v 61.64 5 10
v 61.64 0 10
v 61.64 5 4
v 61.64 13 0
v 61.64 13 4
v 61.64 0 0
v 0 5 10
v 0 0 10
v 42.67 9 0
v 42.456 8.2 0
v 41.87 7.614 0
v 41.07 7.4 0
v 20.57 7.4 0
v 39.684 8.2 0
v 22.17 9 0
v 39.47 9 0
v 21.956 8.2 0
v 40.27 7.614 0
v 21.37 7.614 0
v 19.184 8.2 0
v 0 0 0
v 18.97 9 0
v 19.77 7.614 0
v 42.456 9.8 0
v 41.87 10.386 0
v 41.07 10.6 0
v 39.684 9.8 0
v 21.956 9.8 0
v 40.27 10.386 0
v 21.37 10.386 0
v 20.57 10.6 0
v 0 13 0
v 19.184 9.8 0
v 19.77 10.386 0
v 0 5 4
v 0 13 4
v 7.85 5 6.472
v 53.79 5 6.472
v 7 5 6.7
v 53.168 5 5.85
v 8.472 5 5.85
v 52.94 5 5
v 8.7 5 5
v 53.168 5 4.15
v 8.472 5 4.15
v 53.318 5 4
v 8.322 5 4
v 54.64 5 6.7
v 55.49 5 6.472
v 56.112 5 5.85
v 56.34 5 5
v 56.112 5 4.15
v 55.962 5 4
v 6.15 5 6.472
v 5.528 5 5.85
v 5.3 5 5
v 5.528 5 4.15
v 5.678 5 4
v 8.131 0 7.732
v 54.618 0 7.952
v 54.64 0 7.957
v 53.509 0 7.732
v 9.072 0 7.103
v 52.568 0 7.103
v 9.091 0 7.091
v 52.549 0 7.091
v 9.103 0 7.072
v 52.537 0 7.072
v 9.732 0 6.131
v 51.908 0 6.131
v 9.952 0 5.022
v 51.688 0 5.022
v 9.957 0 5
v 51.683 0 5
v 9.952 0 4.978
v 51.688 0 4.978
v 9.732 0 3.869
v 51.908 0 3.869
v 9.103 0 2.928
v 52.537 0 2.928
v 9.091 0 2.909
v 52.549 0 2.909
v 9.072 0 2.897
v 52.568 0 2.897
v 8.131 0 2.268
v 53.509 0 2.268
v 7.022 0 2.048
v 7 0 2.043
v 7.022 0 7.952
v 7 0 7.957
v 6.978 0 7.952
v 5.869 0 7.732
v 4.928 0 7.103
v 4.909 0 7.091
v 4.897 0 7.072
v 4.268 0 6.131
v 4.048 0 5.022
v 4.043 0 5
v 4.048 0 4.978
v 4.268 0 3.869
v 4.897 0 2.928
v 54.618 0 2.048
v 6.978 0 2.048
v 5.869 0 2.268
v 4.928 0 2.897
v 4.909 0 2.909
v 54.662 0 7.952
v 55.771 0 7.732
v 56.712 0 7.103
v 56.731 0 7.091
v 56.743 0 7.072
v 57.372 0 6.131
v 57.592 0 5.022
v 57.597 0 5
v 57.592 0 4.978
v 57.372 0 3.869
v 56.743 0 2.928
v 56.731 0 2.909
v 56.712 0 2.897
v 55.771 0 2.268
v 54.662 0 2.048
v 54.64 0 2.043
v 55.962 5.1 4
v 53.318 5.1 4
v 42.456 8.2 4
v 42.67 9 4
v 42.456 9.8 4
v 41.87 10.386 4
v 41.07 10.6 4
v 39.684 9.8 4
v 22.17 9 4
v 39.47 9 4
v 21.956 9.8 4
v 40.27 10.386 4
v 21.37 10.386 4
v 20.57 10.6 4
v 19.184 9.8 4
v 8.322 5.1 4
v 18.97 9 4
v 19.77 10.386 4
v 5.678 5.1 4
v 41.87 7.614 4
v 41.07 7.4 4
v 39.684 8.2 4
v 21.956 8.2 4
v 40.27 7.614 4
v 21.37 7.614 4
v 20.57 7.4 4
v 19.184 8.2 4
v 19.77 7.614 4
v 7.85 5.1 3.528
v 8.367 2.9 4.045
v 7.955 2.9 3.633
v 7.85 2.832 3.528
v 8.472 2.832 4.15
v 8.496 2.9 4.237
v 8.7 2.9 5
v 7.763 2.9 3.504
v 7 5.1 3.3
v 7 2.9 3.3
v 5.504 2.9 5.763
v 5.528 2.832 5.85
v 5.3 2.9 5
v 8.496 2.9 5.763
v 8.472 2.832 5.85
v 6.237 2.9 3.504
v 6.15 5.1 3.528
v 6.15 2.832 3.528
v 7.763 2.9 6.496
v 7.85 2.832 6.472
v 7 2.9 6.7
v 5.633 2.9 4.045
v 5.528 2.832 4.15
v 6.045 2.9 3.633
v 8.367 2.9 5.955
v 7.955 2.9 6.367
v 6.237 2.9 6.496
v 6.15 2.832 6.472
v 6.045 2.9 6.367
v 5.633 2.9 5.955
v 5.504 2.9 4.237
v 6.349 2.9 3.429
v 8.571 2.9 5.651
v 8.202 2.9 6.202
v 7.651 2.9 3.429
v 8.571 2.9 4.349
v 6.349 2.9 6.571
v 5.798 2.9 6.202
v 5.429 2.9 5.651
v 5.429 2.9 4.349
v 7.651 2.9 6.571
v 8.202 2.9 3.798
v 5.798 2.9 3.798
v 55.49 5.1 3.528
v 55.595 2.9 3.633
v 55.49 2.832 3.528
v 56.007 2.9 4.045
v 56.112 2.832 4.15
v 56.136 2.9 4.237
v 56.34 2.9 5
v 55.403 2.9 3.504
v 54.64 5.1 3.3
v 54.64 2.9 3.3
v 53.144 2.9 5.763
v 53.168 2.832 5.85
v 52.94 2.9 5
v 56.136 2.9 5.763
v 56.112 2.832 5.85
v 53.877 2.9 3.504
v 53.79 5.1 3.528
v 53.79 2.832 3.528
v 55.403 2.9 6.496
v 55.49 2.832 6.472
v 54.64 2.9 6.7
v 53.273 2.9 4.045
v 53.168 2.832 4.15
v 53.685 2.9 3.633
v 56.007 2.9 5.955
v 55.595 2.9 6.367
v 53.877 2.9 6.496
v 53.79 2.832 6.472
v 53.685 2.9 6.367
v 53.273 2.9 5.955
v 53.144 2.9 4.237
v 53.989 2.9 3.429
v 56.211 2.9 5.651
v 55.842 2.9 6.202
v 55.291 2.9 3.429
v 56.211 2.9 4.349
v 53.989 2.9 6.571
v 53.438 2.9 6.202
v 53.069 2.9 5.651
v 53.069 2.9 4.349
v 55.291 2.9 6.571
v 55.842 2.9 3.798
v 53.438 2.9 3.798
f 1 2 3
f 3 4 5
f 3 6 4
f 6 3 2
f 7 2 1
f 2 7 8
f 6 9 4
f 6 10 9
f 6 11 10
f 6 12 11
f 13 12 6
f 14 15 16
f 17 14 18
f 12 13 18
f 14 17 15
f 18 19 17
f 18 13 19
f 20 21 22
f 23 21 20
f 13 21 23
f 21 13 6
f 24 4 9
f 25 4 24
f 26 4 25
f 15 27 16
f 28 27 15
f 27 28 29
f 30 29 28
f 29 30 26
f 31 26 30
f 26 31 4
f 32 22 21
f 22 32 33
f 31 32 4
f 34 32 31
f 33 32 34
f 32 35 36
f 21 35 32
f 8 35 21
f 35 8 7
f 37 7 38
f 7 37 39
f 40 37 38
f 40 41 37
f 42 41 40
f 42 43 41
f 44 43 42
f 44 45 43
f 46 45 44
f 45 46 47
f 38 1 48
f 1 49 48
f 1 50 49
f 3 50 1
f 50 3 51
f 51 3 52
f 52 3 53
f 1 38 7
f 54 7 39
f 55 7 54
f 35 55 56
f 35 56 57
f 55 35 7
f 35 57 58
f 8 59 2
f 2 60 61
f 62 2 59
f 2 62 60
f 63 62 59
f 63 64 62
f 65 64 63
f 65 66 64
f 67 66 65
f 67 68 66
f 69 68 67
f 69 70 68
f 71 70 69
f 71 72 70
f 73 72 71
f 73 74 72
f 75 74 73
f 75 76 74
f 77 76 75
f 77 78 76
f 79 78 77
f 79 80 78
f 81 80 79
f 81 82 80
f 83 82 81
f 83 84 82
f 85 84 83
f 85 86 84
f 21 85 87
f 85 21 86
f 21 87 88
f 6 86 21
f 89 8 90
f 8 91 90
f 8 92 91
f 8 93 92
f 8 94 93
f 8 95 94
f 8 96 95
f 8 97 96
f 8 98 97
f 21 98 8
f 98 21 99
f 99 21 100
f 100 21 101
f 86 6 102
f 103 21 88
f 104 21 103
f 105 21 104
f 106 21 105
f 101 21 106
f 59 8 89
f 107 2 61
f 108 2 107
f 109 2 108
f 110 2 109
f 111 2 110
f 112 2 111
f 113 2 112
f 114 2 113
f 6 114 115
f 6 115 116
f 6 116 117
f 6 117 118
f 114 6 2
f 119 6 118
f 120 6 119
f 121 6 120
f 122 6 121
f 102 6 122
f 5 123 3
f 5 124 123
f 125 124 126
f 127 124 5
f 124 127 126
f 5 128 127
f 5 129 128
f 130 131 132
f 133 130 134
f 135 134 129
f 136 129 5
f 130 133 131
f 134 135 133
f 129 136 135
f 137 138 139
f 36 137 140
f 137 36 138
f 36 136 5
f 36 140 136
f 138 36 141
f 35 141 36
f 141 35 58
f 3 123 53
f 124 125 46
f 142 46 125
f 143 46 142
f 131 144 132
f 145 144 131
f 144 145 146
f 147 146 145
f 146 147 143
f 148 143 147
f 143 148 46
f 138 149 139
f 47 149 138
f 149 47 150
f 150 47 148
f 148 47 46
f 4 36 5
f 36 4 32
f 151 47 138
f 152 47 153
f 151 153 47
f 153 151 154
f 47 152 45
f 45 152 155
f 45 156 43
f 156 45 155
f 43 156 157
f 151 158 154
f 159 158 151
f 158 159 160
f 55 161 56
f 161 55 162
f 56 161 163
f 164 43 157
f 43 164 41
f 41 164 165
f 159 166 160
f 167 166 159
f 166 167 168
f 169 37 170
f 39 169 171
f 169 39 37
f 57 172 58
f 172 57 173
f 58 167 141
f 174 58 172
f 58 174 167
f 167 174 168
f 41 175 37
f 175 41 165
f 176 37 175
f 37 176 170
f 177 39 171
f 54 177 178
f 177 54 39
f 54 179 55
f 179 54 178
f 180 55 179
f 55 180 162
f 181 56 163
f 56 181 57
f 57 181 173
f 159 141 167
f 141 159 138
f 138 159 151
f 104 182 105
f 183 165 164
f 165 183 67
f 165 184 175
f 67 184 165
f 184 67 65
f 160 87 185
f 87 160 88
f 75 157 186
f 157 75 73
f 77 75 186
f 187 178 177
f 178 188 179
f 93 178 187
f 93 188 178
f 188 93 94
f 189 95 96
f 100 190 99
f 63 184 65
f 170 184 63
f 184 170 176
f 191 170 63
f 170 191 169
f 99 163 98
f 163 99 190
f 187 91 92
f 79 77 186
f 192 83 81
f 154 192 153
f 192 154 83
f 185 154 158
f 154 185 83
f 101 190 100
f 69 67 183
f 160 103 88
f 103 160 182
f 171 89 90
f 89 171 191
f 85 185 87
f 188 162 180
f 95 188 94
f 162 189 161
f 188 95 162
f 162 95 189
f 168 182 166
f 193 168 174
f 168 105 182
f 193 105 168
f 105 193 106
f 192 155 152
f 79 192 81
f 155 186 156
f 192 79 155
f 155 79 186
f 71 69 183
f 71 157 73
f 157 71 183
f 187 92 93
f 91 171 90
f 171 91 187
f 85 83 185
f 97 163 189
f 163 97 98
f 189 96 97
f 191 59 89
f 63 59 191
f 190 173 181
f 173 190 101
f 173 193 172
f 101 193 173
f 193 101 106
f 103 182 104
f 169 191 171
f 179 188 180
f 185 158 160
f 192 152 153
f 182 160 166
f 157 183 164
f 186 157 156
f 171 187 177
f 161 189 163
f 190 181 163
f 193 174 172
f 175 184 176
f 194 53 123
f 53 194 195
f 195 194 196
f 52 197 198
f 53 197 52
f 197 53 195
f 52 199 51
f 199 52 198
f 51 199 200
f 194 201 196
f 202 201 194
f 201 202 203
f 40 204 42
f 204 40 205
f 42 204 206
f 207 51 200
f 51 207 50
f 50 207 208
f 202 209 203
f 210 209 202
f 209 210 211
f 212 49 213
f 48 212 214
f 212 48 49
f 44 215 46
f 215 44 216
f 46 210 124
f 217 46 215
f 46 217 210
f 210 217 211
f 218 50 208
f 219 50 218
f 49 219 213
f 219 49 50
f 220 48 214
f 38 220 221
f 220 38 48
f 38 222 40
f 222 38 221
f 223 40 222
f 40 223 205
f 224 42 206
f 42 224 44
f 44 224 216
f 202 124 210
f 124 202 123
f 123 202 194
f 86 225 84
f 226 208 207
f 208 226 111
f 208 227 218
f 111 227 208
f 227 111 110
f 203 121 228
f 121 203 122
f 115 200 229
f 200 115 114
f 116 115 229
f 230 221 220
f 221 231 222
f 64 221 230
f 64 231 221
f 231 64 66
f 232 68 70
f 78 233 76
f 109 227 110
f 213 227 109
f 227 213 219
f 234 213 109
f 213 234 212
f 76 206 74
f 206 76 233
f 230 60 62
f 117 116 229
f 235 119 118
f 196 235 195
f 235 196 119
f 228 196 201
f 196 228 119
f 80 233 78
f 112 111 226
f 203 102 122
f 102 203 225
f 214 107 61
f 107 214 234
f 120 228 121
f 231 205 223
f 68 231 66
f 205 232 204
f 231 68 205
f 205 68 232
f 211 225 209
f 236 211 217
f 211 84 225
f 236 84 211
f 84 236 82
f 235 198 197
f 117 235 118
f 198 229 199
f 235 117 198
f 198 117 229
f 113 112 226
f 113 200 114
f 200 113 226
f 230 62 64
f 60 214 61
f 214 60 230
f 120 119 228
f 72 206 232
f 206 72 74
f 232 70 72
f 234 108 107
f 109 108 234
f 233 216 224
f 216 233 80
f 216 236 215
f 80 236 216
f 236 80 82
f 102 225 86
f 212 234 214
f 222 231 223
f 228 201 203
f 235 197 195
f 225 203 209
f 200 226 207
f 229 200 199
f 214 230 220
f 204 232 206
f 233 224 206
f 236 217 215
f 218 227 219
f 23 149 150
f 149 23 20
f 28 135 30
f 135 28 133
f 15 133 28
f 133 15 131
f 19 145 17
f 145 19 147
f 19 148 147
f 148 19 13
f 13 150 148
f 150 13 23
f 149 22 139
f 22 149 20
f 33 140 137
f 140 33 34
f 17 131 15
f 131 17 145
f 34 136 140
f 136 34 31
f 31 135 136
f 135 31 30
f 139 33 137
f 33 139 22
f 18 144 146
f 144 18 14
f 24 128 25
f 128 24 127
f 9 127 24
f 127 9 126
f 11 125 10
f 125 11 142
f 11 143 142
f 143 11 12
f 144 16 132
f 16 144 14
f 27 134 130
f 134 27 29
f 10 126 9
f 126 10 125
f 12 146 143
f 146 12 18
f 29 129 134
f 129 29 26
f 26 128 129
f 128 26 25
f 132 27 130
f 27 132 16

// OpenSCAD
// rack_mount.scad — 19" 4U open tray rack mount
// ATX motherboard (flat) + EVGA 2080 Ti Black (vertical) + ATX PSU
//
// Four L-shaped printable sections with seam joints:
//   FL (front-left)  — board front standoffs + front panel left
//   FR (front-right) — PSU cradle front      + front panel right
//   RL (rear-left)   — board rear standoffs  + rear panel left
//   RR (rear-right)  — PSU cradle rear       + rear panel right
//
// Joint strategy — no interior walls:
//   • Floor-edge box joint tabs (tw=3mm tall) along the floor seam
//   • Front/rear panel tongue tabs at 2 Z heights (on the panel face)
//   • Side rail tongue tabs at 2 Z heights (on the rail face)
//   Each tab is part of an existing wall/floor, so nothing floats.

// ─── PARAMETERS ───────────────────────────────────────────────────────────────

rack_u   = 4;
u_mm     = 44.45;
rack_h   = rack_u * u_mm;   // 177.8 mm
rack_ow  = 482.6;
ear_w    = 19.3;
tray_w   = rack_ow - 2*ear_w;  // ≈ 444 mm

tray_d   = 350;
tw       = 3;

atx_w    = 305;
atx_d    = 243.84;  // 9.6" standard ATX depth (board is 12" × 9.6")
soff_h   = 6;
soff_od  = 6.5;
soff_id  = 3.2;

// Hole positions from VenOunan ATX Motherboard Pattern (standard ATX layout).
// pt[0] = mm from left edge of board (X parallel to IO)
// pt[1] = mm from front edge of board (Y, increasing toward IO)
// by0 already adds the 1mm IO gap, so these are pure board-relative coords.
//
// Column X:  A/G/K = 16.51   C/H/L = 140.97   F/J/M = 298.45
// Row    Y:  K/L/M =  6.35   G/H/J =  66.04   F = 220.98   A/C = 233.68
atx_holes = [
  [  16, 231.68],  // A: 0.40" from IO, left column
  [ 140.97, 231.68],  // C: 0.40" from IO, center column
  [ 298.45, 218.98],  // F: 0.90" from IO, right column
  [  16,  78],  // G: middle row, left column
  [ 140.97,  78],  // H: middle row, center column
  [ 298.45,  78],  // J: middle row, right column
  [  16,   6],  // K: 0.25" from front, left column
  [ 140.97,   6],  // L: 0.25" from front, center column
  [ 298.45,   6],  // M: 0.25" from front, right column
];

bx0 = tw;
by0 = tray_d - tw - atx_d - 1;  // 1mm clearance between IO edge and rear panel for GPU bracket tabs

psu_xw   = 86;
psu_yd   = 140;
psu_zh   = 150;

// PSU mounting hole positions — X coords are in MODEL space (front-of-case view).
// Adam measures from the BACK, so left/right are mirrored: Adam's right = model's left.
//
//   Adam's view (from back)    →   Model coord
//   top-right  (5mm  from Adam-right) →  5.0mm from model-left
//   top-left   (16mm from Adam-left)  →  86-16 = 70.0mm from model-left
//   bottom-right (5.6mm from Adam-right, 7.3mm up)  →  5.6mm from model-left
//   bottom-left  (6.5mm from Adam-left, 31mm up)    →  86-6.5 = 79.5mm from model-left

psu_hole_tl_x =   5.4;   // model top-left    = Adam's top-right (confirmed correct)
psu_hole_tr_x =  69.7;   // model top-right   = Adam's top-left  (16mm from Adam's left)
psu_hole_bl_x =   5.4;   // model bottom-left = Adam's bottom-right (5.6mm from Adam's right)
psu_hole_br_x =  80;   // model bottom-right= Adam's bottom-left  (6.5mm from Adam's left → 86-6.5)

psu_hole_top_z =  145.0;  // both top holes: 5mm from top  (150 - 5)
psu_hole_bl_z  =    7.3;  // model bottom-left  = Adam's bottom-right: 7.3mm from bottom
psu_hole_br_z  =   31.0;  // model bottom-right = Adam's bottom-left:  31mm from bottom

psu_holes = [
    [ psu_hole_tl_x, psu_hole_top_z ],  // top-left
    [ psu_hole_tr_x, psu_hole_top_z ],  // top-right
    [ psu_hole_bl_x, psu_hole_bl_z  ],  // bottom-left
    [ psu_hole_br_x, psu_hole_br_z  ],  // bottom-right
];

psu_boss_c  = 10;   // boss footprint size (square)
psu_boss_th = 4;    // boss protrusion beyond inner face (into tray)
psu_gap  = 12;
psu_x0   = bx0 + atx_w + psu_gap;   // 320
psu_y0   = tray_d - tw - psu_yd;

gpu_l    = 267;
gpu_zh   = 125;
gpu_xw   = 2 * 20.32;
pcie_bx  = 110;
pcie_by  = 50;
gpu_x0   = bx0 + pcie_bx - gpu_xw/2;
gpu_y0   = by0 + pcie_by - 73;

bkt_cut_w   = gpu_xw + 1;
bkt_cut_h   = 121;
bkt_cut_z0  = tw;
bkt_cut_x0  = gpu_x0 - 0.5;

ret_bar_w      = bkt_cut_w + 20;
ret_bar_h      = 10;
ret_bar_d      = tw + 2;
ret_screw_d    = 3.4;
ret_bar_z0     = bkt_cut_z0 + bkt_cut_h;
ret_boss_inset = 8;   // how far bosses protrude INWARD from inner panel face

ret_lip_d   = 8;    // lip protrusion depth — extended to sit over GPU bracket (was 3mm)
ret_lip_h   = 4;    // lip thickness (Z)
ret_gpu_screw_d = 3.2;          // M3 clearance for GPU bracket screws
ret_gpu_screw_sp = 20.5;        // center-to-center spacing of GPU bracket holes

tab_sw  = 10.5;
tab_sd  = 5;
tab_x   = [gpu_x0 + gpu_xw*0.25, gpu_x0 + gpu_xw*0.75];

fan_sq   = 120;
fan_msp  = 105;
fan1_cx  = tray_w/2 - fan_sq/2 - 5;
fan2_cx  = tray_w/2 + fan_sq/2 + 5;
fan_cz   = rack_h / 2;

io_w     = 165;
io_h     = 46;
io_x0    = 150;   // IO shield at left (IO) edge of board — standard ATX position
io_z0    = tw + soff_h;

cut_x    = tray_w / 2;   // ≈ 222 mm
cut_y    = tray_d / 2;   // 200 mm

// Joint geometry
fj_d     = 6;     // tab depth (protrusion past seam face)
fj_w     = 18;    // tab width along seam
fj_fit   = 0.25;  // socket clearance per side
fj_th    = 8;     // panel/rail tab height (for the wall-face tabs)

// Ear interlock geometry
etab_d   = tw;    // tab depth = wall thickness — slot goes flush through rail, clearly visible
etab_h   = 15;    // tab height (Z direction)
etab_fit = 0.2;   // slot clearance per side

// Rear support lip
lip_yd   = 25;    // how far the lip extends behind the rear panel
lip_zh   = 6;     // lip thickness (Z)
lip_md   = 4.5;   // M4 clearance hole for bolting to rear cross-brace

// ─── UTILITY ──────────────────────────────────────────────────────────────────

module standoff() {
    difference() {
        cylinder(h=soff_h, d=soff_od, $fn=24);
        cylinder(h=soff_h+0.1, d=soff_id, $fn=16);
    }
}

module fan_cutout(cx, cz) {
    translate([cx, -0.1, cz]) rotate([-90,0,0]) {
        cylinder(h=tw+0.2, d=fan_sq-8, $fn=64);
        for (sx=[-1,1], sz=[-1,1])
            translate([sx*fan_msp/2, sz*fan_msp/2, 0])
                cylinder(h=tw+0.2, d=4.4, $fn=12);
    }
}

// ─── JOINT MODULES ────────────────────────────────────────────────────────────
// All tabs attach to existing geometry (floor/panel/rail).  Nothing floats.
//
// ── X=cut_x seam: floor-edge box joints (3mm tall = floor thickness) ──────────
// Even-index tabs belong to the LEFT piece (FL, RL).
// Odd-index tabs belong to the RIGHT piece (FR, RR).

module xj_floor_L(y0, y1) {         // LEFT tabs protruding +X
    n = floor((y1-y0)/fj_w);
    for (i=[0:n-1]) if (i%2==0)
        translate([cut_x, y0+i*fj_w, 0]) cube([fj_d, fj_w, tw]);
}
module xj_floor_L_sock(y0, y1) {    // LEFT sockets (receive R tabs)
    n = floor((y1-y0)/fj_w);
    for (i=[0:n-1]) if (i%2==1)
        translate([cut_x-fj_d-0.01, y0+i*fj_w-fj_fit, -0.01])
            cube([fj_d+0.02, fj_w+2*fj_fit, tw+0.02]);
}
module xj_floor_R(y0, y1) {         // RIGHT tabs protruding -X
    n = floor((y1-y0)/fj_w);
    for (i=[0:n-1]) if (i%2==1)
        translate([cut_x-fj_d, y0+i*fj_w, 0]) cube([fj_d, fj_w, tw]);
}
module xj_floor_R_sock(y0, y1) {    // RIGHT sockets (receive L tabs)
    n = floor((y1-y0)/fj_w);
    for (i=[0:n-1]) if (i%2==0)
        translate([cut_x-0.01, y0+i*fj_w-fj_fit, -0.01])
            cube([fj_d+0.02, fj_w+2*fj_fit, tw+0.02]);
}

// ── Y=cut_y seam: floor-edge box joints ──────────────────────────────────────
// Even-index tabs belong to the FRONT piece (FL, FR).
// Odd-index tabs belong to the REAR piece (RL, RR).

module yj_floor_F(x0, x1) {         // FRONT tabs protruding +Y
    n = floor((x1-x0)/fj_w);
    for (i=[0:n-1]) if (i%2==0)
        translate([x0+i*fj_w, cut_y, 0]) cube([fj_w, fj_d, tw]);
}
module yj_floor_F_sock(x0, x1) {    // FRONT sockets (receive R tabs)
    n = floor((x1-x0)/fj_w);
    for (i=[0:n-1]) if (i%2==1)
        translate([x0+i*fj_w-fj_fit, cut_y-fj_d-0.01, -0.01])
            cube([fj_w+2*fj_fit, fj_d+0.02, tw+0.02]);
}
module yj_floor_R(x0, x1) {         // REAR tabs protruding -Y
    n = floor((x1-x0)/fj_w);
    for (i=[0:n-1]) if (i%2==1)
        translate([x0+i*fj_w, cut_y-fj_d, 0]) cube([fj_w, fj_d, tw]);
}
module yj_floor_R_sock(x0, x1) {    // REAR sockets (receive F tabs)
    n = floor((x1-x0)/fj_w);
    for (i=[0:n-1]) if (i%2==0)
        translate([x0+i*fj_w-fj_fit, cut_y-0.01, -0.01])
            cube([fj_w+2*fj_fit, fj_d+0.02, tw+0.02]);
}

// ── Front panel seam at X=cut_x ───────────────────────────────────────────────
// Panel is tw=3mm thick in Y.  Tabs sit within that thickness, at 2 Z heights.
// FL has the tongue; FR has the groove.

module front_panel_tongue() {
    for (z=[rack_h*0.33, rack_h*0.67])
        translate([cut_x, 0, z-fj_th/2]) cube([fj_d, tw, fj_th]);
}
module front_panel_groove() {
    for (z=[rack_h*0.33, rack_h*0.67])
        translate([cut_x-0.01, -0.1, z-fj_th/2-fj_fit])
            cube([fj_d+0.12, tw+0.2, fj_th+2*fj_fit]);
}

// ── Rear panel seam at X=cut_x ────────────────────────────────────────────────
// RL has the tongue; RR has the groove.

module rear_panel_tongue() {
    for (z=[rack_h*0.33, rack_h*0.67])
        translate([cut_x, tray_d-tw, z-fj_th/2]) cube([fj_d, tw, fj_th]);
}
module rear_panel_groove() {
    for (z=[rack_h*0.33, rack_h*0.67])
        translate([cut_x-0.01, tray_d-tw-0.1, z-fj_th/2-fj_fit])
            cube([fj_d+0.12, tw+0.2, fj_th+2*fj_fit]);
}

// ── Left rail seam at Y=cut_y ─────────────────────────────────────────────────
// Rail is tw=3mm wide in X.  FL has tongue; RL has groove.

module left_rail_tongue() {
    for (z=[rack_h*0.33, rack_h*0.67])
        translate([0, cut_y, z-fj_th/2]) cube([tw, fj_d, fj_th]);
}
module left_rail_groove() {
    for (z=[rack_h*0.33, rack_h*0.67])
        translate([-0.1, cut_y-0.01, z-fj_th/2-fj_fit])
            cube([tw+0.2, fj_d+0.12, fj_th+2*fj_fit]);
}

// ── Right rail seam at Y=cut_y ────────────────────────────────────────────────
// FR has tongue; RR has groove.

module right_rail_tongue() {
    for (z=[rack_h*0.33, rack_h*0.67])
        translate([tray_w-tw, cut_y, z-fj_th/2]) cube([tw, fj_d, fj_th]);
}
module right_rail_groove() {
    for (z=[rack_h*0.33, rack_h*0.67])
        translate([tray_w-tw-0.1, cut_y-0.01, z-fj_th/2-fj_fit])
            cube([tw+0.2, fj_d+0.12, fj_th+2*fj_fit]);
}

// ── Ear interlocks ────────────────────────────────────────────────────────────
// The tray rails start at Y=tw (no front face).  The ear extension fills that
// front face gap (X=0..tw, Y=0..tw, Z=tw..rack_h).  Interlock tabs protrude
// from the extension's back face (+Y from Y=tw) into the rail front face slots.
// The ear slides in from the side (+X for left, -X for right) and the tabs ride
// into the slots — no through-holes, no assembly conflict.

module left_ear_tabs() {
    // Protrude +Y from extension back face (Y=tw in ear module space)
    for (zi = [1:3])
        translate([ear_w, tw, rack_h*zi/4 - etab_h/2]) cube([tw, etab_d, etab_h]);
}
module left_ear_slots() {
    // Cut into the left rail's front face in the +Y direction
    for (zi = [1:3])
        translate([-0.1, tw-0.1, rack_h*zi/4 - etab_h/2 - etab_fit])
            cube([tw+0.2, etab_d+etab_fit+0.1, etab_h+2*etab_fit]);
}

module right_ear_tabs() {
    // Protrude +Y from extension back face (Y=tw in ear module space)
    for (zi = [1:3])
        translate([-tw, tw, rack_h*zi/4 - etab_h/2]) cube([tw, etab_d, etab_h]);
}
module right_ear_slots() {
    // Cut into the right rail's front face in the +Y direction
    for (zi = [1:3])
        translate([tray_w-tw-0.1, tw-0.1, rack_h*zi/4 - etab_h/2 - etab_fit])
            cube([tw+0.2, etab_d+etab_fit+0.1, etab_h+2*etab_fit]);
}

// ─── STRUCTURAL MODULES ───────────────────────────────────────────────────────

module atx_standoffs() {
    for (pt = atx_holes)
        translate([bx0 + pt[0], by0 + pt[1], tw]) standoff();
}

module front_panel_solid() {
    // Inset by tw on each side — ears fill the gap at X=[0,tw] and X=[tray_w-tw,tray_w]
    difference() {
        translate([tw, 0, 0]) cube([tray_w-2*tw, tw, rack_h]);
        fan_cutout(fan1_cx, fan_cz);
        fan_cutout(fan2_cx, fan_cz);
        for (i = [-3:3])
            translate([tray_w/2 - 6, -0.1, fan_cz + i*15]) cube([12, tw+0.2, 9]);
    }
}

// Helper: one L-shaped boss that bridges a PSU mounting hole to the two nearest panel edges
// so the boss is never a floating island in the middle of the PSU opening.
module psu_boss_bridge(h) {
    hx   = psu_x0 + h[0];
    hz   = tw + h[1];
    // Horizontal bridge: hole centred at hx, spans from PSU edge to hole+half-boss
    bx0_ = (h[0] < psu_xw/2) ? psu_x0           : hx - psu_boss_c/2;
    bx1_ = (h[0] < psu_xw/2) ? hx + psu_boss_c/2 : psu_x0 + psu_xw;
    // Vertical bridge: hole centred at hz, spans from floor/ceiling edge to hole+half-boss
    bz0_ = (h[1] < psu_zh/2) ? tw                : hz - psu_boss_c/2;
    bz1_ = (h[1] < psu_zh/2) ? hz + psu_boss_c/2 : tw + psu_zh;
    translate([bx0_,              -psu_boss_th, hz - psu_boss_c/2]) cube([bx1_-bx0_,    tw+psu_boss_th, psu_boss_c]);
    translate([hx - psu_boss_c/2, -psu_boss_th, bz0_])             cube([psu_boss_c, tw+psu_boss_th, bz1_-bz0_]);
}

module rear_panel_solid() {
    psu_c   = psu_boss_c;
    boss_th = psu_boss_th;
    m4_d    = 4.5;  // M4 clearance hole diameter

    difference() {
        union() {
            // Panel with all openings already cut — bosses added after so they
            // survive the opening cuts even when not in a corner zone
            difference() {
                cube([tray_w, tw, rack_h]);
                // IO shield opening
                translate([io_x0, -0.1, io_z0]) cube([io_w, tw+0.2, io_h]);
                // PSU opening — 3 cuts that preserve 10mm corners
                translate([psu_x0,       -0.1, tw+psu_c])        cube([psu_xw,          tw+0.2, psu_zh-2*psu_c]);
                translate([psu_x0+psu_c, -0.1, tw])               cube([psu_xw-2*psu_c, tw+0.2, psu_c]);
                translate([psu_x0+psu_c, -0.1, tw+psu_zh-psu_c]) cube([psu_xw-2*psu_c, tw+0.2, psu_c]);
                // PCIe bracket opening
                translate([bkt_cut_x0, -0.1, bkt_cut_z0]) cube([bkt_cut_w, tw+0.2, bkt_cut_h]);
            }
            // PSU mounting bosses — L-shaped bridges so no boss floats in the opening
            for (h = psu_holes) psu_boss_bridge(h);
        }
        // PSU M4 mounting holes drilled through bosses and panel
        for (h = psu_holes)
            translate([psu_x0 + h[0], -boss_th-0.1, tw + h[1]])
                rotate([-90,0,0]) cylinder(h=tw+boss_th+0.2, d=m4_d, $fn=16);
        // Retainer bar screw holes through rear panel (bosses are separate geometry, inward)
        for (bx = [bkt_cut_x0-7, bkt_cut_x0+bkt_cut_w+7])
            translate([bx, -0.1, ret_bar_z0+ret_bar_h/2])
                rotate([-90,0,0]) cylinder(h=tw+0.2, d=ret_screw_d, $fn=12);
    }
}

// GPU retainer bar mounting bosses — protrude INWARD from inner panel face.
// Screws go: bar (outside) → panel → boss (inside). Bar sits flush on outer face.
module retainer_bar_bosses() {
    difference() {
        union() {
            // Bosses on the INSIDE (−Y from inner face = tray_d−tw, protrude inward)
            translate([bkt_cut_x0-12,          tray_d-tw-ret_boss_inset, ret_bar_z0-1]) cube([10, ret_boss_inset, ret_bar_h+2]);
            translate([bkt_cut_x0+bkt_cut_w+2, tray_d-tw-ret_boss_inset, ret_bar_z0-1]) cube([10, ret_boss_inset, ret_bar_h+2]);
        }
        // Clearance holes drilled from outside (outer face) through panel and full boss depth
        for (bx = [bkt_cut_x0-7, bkt_cut_x0+bkt_cut_w+7])
            translate([bx, tray_d-tw-ret_boss_inset-0.1, ret_bar_z0+ret_bar_h/2])
                rotate([-90,0,0]) cylinder(h=tw+ret_boss_inset+0.2, d=ret_screw_d, $fn=12);
    }
}

// Rear support lip — world coordinates. Extends behind the rear panel so the tray
// can rest on a cross-brace or rear rack rails instead of hanging from the ears alone.
// x0/x1 define which X slice of the tray this lip spans (split at cut_x for RL/RR).
module rear_support_lip(x0, x1) {
    difference() {
        translate([x0, tray_d-tw, 0]) cube([x1-x0, tw+lip_yd, lip_zh]);
        for (x = [x0+lip_yd/2 : lip_yd : x1-lip_yd/2])
            translate([x, tray_d+lip_yd/2, -0.1])
                cylinder(h=lip_zh+0.2, d=lip_md, $fn=16);
    }
}

module psu_cradle() {
    cw = 4;
    translate([psu_x0-cw, psu_y0, 0])      cube([psu_xw+2*cw, psu_yd+cw, tw+cw]);
    translate([psu_x0-cw, psu_y0, tw+cw])  cube([cw, psu_yd, psu_zh/2]);
    translate([psu_x0+psu_xw, psu_y0, tw+cw]) cube([cw, psu_yd, psu_zh/2]);
}

// Plain tray shell — floor + two outer rails.  No interior ribs.
// Rails start at Y=tw (not Y=0) so the ear extensions can fill the front face gap.
module tray_shell(ear_slots=true) {
    difference() {
        union() {
            cube([tray_w, tray_d, tw]);
            translate([0,        tw, 0]) cube([tw, tray_d-tw, rack_h]);
            translate([tray_w-tw, tw, 0]) cube([tw, tray_d-tw, rack_h]);
        }
        // GPU floor tab slots
        for (tx = tab_x)
            translate([tx-tab_sw/2, tray_d-tw-tab_sd, -0.1])
                cube([tab_sw, tab_sd+tw+0.2, tw+0.2]);
        // Ear interlock slots — omit when ears are fused directly to FL/FR
        if (ear_slots) {
            left_ear_slots();
            right_ear_slots();
        }
    }
}

module gpu_retainer_bar() {
    difference() {
        union() {
            // Main bar body — screws to rear panel bosses
            cube([ret_bar_w, ret_bar_d, ret_bar_h]);
            // Lip at BOTTOM of bar (z=0), protruding in +Y — sits on top of GPU bracket
            // Bar is "upside down" vs original: lip hangs down over the bracket edge
            translate([0, ret_bar_d, 0]) cube([ret_bar_w, ret_lip_d, ret_lip_h]);
        }
        // Panel mounting screw holes (through bar body, front-to-back in Y)
        for (bx = [7, ret_bar_w-7])
            translate([bx, -0.1, ret_bar_h/2]) rotate([-90,0,0]) {
                cylinder(h=ret_bar_d+0.2, d=ret_screw_d, $fn=12);
                cylinder(h=3, d1=6, d2=ret_screw_d, $fn=16);
            }
        // GPU bracket screw holes — through lip in Z, 20.5mm apart, centered on bar
        for (gx = [ret_bar_w/2 - ret_gpu_screw_sp/2, ret_bar_w/2 + ret_gpu_screw_sp/2])
            translate([gx, ret_bar_d + ret_lip_d/2, -0.1])
                cylinder(h=ret_lip_h+0.2, d=ret_gpu_screw_d, $fn=12);
    }
}

module rack_ear() {
    difference() {
        cube([ear_w, tw, rack_h]);
        for (u = [0:rack_u-1]) {
            z1 = u*u_mm + (u_mm-15.875)/2;
            z2 = z1 + 15.875;
            for (zh = [z1, z2])
                translate([ear_w/2, -0.1, zh]) rotate([-90,0,0])
                    hull() {
                        translate([0,-2.5,0]) cylinder(h=tw+0.2, d=7.1, $fn=20);
                        translate([0, 2.5,0]) cylinder(h=tw+0.2, d=7.1, $fn=20);
                    }
        }
    }
}

// Extension fills the front face gap left by the rail recess (starts at Z=tw, above floor)
module rack_ear_L() { union() { rack_ear(); left_ear_tabs();  translate([ear_w,  0, tw]) cube([tw, tw, rack_h-tw]); } }
module rack_ear_R() { union() { rack_ear(); right_ear_tabs(); translate([-tw,    0, tw]) cube([tw, tw, rack_h-tw]); } }

// ─── GHOSTS ───────────────────────────────────────────────────────────────────

module ghost_board() {
    color("limegreen",0.2) translate([bx0,by0,tw+soff_h]) cube([atx_w,atx_d,1.6]);
}
module ghost_gpu() {
    color("royalblue",0.2) translate([gpu_x0,gpu_y0,tw+soff_h+1.6]) cube([gpu_xw,gpu_l,gpu_zh]);
}
module ghost_psu() {
    color("darkorange",0.2) translate([psu_x0,psu_y0,tw]) cube([psu_xw,psu_yd,psu_zh]);
}

// ─── ASSEMBLY ─────────────────────────────────────────────────────────────────

module assembly() {
    color("silver") {
        tray_shell();
        atx_standoffs();
        psu_cradle();
        front_panel_solid();
        translate([0, tray_d-tw, 0]) rear_panel_solid();
        retainer_bar_bosses();
        rear_support_lip(0, cut_x);
        rear_support_lip(cut_x, tray_w);
        translate([bkt_cut_x0-(ret_bar_w-bkt_cut_w)/2, tray_d, ret_bar_z0])
            gpu_retainer_bar();  // bar body sits above bracket top; lip at z=0 drops over it
    }
    color("dimgray") {
        // Ears fused into tray_FL/FR for printing — shown here for assembly preview only
        translate([-ear_w, 0, 0]) rack_ear_L();
        translate([tray_w, 0, 0]) rack_ear_R();
    }
    ghost_board();  ghost_gpu();  ghost_psu();
}

// ─── PRINTABLE SECTIONS ───────────────────────────────────────────────────────

// ── FL: Front-Left ─────────────────────────────────────────────────────────────
// On a Bambu P1S (256mm bed) the ear fits: 241×178mm total — print as one piece.
module tray_FL() {
    difference() {
        union() {
            intersection() {
                union() { tray_shell(ear_slots=false); front_panel_solid(); atx_standoffs(); }
                cube([cut_x, cut_y, rack_h+1]);
            }
            xj_floor_L(0, cut_y);       // floor tabs → FR
            yj_floor_F(0, cut_x);       // floor tabs → RL
            front_panel_tongue();        // panel tongue → FR
            left_rail_tongue();          // rail tongue  → RL
            // Left rack ear fused in — no separate ear piece needed
            translate([-ear_w, 0, 0]) rack_ear();
            translate([0, 0, tw]) cube([tw, tw, rack_h-tw]);  // front-face gap fill
        }
        xj_floor_L_sock(0, cut_y);      // floor sockets for FR's tabs
        yj_floor_F_sock(0, cut_x);      // floor sockets for RL's tabs
    }
}

// ── FR: Front-Right ────────────────────────────────────────────────────────────
// On a Bambu P1S (256mm bed) the ear fits: 241×178mm total — print as one piece.
module tray_FR() {
    difference() {
        union() {
            intersection() {
                union() { tray_shell(ear_slots=false); front_panel_solid(); psu_cradle(); atx_standoffs(); }
                translate([cut_x,0,0]) cube([tray_w-cut_x, cut_y, rack_h+1]);
            }
            xj_floor_R(0, cut_y);       // floor tabs → FL
            yj_floor_F(cut_x, tray_w);  // floor tabs → RR
            right_rail_tongue();         // rail tongue → RR
            // Right rack ear fused in — no separate ear piece needed
            translate([tray_w, 0, 0]) rack_ear();
            translate([tray_w-tw, 0, tw]) cube([tw, tw, rack_h-tw]);  // front-face gap fill
        }
        xj_floor_R_sock(0, cut_y);      // floor sockets for FL's tabs
        yj_floor_F_sock(cut_x, tray_w); // floor sockets for RR's tabs
        front_panel_groove();            // panel groove receives FL's tongue
    }
}

// ── RL: Rear-Left ──────────────────────────────────────────────────────────────
module tray_RL() {
    difference() {
        union() {
            intersection() {
                union() {
                    tray_shell();
                    atx_standoffs();
                    translate([0, tray_d-tw, 0]) rear_panel_solid();
                }
                translate([0,cut_y,0]) cube([cut_x, tray_d-cut_y, rack_h+1]);
            }
            xj_floor_L(cut_y, tray_d);  // floor tabs → RR
            yj_floor_R(0, cut_x);        // floor tabs → FL
            rear_panel_tongue();          // panel tongue → RR
            retainer_bar_bosses();        // outside mask — protrude beyond tray_d
            rear_support_lip(0, cut_x);  // outside mask — extends beyond tray_d
        }
        xj_floor_L_sock(cut_y, tray_d); // floor sockets for RR's tabs
        yj_floor_R_sock(0, cut_x);       // floor sockets for FL's tabs
        left_rail_groove();               // rail groove receives FL's tongue
    }
}

// ── RR: Rear-Right ─────────────────────────────────────────────────────────────
module tray_RR() {
    difference() {
        union() {
            intersection() {
                union() {
                    tray_shell();
                    atx_standoffs();
                    psu_cradle();
                    translate([0, tray_d-tw, 0]) rear_panel_solid();
                }
                translate([cut_x,cut_y,0]) cube([tray_w-cut_x, tray_d-cut_y, rack_h+1]);
            }
            xj_floor_R(cut_y, tray_d);  // floor tabs → RL
            yj_floor_R(cut_x, tray_w);  // floor tabs → FR
            rear_support_lip(cut_x, tray_w); // outside mask — extends beyond tray_d
        }
        xj_floor_R_sock(cut_y, tray_d); // floor sockets for RL's tabs
        yj_floor_R_sock(cut_x, tray_w); // floor sockets for FR's tabs
        rear_panel_groove();              // panel groove receives RL's tongue
        right_rail_groove();              // rail groove receives FR's tongue
    }
}

// ─── RENDER SELECTION ─────────────────────────────────────────────────────────
// Uncomment ONE section → F6 → Export as STL.  Print floor-face-down.
// tray_FL and tray_FR include their rack ears — no separate ear print needed (Bambu P1S bed).

//assembly();

//tray_FL();                              // left front half + left ear  (241×178mm)
//translate([-cut_x, 0, 0]) tray_FR();   // right front half + right ear (241×178mm)
//translate([0, -cut_y, 0])      tray_RL();
//translate([-cut_x, -cut_y, 0]) tray_RR();
gpu_retainer_bar();
//rack_ear();   // standalone ear (no longer needed — fused into FL/FR)
